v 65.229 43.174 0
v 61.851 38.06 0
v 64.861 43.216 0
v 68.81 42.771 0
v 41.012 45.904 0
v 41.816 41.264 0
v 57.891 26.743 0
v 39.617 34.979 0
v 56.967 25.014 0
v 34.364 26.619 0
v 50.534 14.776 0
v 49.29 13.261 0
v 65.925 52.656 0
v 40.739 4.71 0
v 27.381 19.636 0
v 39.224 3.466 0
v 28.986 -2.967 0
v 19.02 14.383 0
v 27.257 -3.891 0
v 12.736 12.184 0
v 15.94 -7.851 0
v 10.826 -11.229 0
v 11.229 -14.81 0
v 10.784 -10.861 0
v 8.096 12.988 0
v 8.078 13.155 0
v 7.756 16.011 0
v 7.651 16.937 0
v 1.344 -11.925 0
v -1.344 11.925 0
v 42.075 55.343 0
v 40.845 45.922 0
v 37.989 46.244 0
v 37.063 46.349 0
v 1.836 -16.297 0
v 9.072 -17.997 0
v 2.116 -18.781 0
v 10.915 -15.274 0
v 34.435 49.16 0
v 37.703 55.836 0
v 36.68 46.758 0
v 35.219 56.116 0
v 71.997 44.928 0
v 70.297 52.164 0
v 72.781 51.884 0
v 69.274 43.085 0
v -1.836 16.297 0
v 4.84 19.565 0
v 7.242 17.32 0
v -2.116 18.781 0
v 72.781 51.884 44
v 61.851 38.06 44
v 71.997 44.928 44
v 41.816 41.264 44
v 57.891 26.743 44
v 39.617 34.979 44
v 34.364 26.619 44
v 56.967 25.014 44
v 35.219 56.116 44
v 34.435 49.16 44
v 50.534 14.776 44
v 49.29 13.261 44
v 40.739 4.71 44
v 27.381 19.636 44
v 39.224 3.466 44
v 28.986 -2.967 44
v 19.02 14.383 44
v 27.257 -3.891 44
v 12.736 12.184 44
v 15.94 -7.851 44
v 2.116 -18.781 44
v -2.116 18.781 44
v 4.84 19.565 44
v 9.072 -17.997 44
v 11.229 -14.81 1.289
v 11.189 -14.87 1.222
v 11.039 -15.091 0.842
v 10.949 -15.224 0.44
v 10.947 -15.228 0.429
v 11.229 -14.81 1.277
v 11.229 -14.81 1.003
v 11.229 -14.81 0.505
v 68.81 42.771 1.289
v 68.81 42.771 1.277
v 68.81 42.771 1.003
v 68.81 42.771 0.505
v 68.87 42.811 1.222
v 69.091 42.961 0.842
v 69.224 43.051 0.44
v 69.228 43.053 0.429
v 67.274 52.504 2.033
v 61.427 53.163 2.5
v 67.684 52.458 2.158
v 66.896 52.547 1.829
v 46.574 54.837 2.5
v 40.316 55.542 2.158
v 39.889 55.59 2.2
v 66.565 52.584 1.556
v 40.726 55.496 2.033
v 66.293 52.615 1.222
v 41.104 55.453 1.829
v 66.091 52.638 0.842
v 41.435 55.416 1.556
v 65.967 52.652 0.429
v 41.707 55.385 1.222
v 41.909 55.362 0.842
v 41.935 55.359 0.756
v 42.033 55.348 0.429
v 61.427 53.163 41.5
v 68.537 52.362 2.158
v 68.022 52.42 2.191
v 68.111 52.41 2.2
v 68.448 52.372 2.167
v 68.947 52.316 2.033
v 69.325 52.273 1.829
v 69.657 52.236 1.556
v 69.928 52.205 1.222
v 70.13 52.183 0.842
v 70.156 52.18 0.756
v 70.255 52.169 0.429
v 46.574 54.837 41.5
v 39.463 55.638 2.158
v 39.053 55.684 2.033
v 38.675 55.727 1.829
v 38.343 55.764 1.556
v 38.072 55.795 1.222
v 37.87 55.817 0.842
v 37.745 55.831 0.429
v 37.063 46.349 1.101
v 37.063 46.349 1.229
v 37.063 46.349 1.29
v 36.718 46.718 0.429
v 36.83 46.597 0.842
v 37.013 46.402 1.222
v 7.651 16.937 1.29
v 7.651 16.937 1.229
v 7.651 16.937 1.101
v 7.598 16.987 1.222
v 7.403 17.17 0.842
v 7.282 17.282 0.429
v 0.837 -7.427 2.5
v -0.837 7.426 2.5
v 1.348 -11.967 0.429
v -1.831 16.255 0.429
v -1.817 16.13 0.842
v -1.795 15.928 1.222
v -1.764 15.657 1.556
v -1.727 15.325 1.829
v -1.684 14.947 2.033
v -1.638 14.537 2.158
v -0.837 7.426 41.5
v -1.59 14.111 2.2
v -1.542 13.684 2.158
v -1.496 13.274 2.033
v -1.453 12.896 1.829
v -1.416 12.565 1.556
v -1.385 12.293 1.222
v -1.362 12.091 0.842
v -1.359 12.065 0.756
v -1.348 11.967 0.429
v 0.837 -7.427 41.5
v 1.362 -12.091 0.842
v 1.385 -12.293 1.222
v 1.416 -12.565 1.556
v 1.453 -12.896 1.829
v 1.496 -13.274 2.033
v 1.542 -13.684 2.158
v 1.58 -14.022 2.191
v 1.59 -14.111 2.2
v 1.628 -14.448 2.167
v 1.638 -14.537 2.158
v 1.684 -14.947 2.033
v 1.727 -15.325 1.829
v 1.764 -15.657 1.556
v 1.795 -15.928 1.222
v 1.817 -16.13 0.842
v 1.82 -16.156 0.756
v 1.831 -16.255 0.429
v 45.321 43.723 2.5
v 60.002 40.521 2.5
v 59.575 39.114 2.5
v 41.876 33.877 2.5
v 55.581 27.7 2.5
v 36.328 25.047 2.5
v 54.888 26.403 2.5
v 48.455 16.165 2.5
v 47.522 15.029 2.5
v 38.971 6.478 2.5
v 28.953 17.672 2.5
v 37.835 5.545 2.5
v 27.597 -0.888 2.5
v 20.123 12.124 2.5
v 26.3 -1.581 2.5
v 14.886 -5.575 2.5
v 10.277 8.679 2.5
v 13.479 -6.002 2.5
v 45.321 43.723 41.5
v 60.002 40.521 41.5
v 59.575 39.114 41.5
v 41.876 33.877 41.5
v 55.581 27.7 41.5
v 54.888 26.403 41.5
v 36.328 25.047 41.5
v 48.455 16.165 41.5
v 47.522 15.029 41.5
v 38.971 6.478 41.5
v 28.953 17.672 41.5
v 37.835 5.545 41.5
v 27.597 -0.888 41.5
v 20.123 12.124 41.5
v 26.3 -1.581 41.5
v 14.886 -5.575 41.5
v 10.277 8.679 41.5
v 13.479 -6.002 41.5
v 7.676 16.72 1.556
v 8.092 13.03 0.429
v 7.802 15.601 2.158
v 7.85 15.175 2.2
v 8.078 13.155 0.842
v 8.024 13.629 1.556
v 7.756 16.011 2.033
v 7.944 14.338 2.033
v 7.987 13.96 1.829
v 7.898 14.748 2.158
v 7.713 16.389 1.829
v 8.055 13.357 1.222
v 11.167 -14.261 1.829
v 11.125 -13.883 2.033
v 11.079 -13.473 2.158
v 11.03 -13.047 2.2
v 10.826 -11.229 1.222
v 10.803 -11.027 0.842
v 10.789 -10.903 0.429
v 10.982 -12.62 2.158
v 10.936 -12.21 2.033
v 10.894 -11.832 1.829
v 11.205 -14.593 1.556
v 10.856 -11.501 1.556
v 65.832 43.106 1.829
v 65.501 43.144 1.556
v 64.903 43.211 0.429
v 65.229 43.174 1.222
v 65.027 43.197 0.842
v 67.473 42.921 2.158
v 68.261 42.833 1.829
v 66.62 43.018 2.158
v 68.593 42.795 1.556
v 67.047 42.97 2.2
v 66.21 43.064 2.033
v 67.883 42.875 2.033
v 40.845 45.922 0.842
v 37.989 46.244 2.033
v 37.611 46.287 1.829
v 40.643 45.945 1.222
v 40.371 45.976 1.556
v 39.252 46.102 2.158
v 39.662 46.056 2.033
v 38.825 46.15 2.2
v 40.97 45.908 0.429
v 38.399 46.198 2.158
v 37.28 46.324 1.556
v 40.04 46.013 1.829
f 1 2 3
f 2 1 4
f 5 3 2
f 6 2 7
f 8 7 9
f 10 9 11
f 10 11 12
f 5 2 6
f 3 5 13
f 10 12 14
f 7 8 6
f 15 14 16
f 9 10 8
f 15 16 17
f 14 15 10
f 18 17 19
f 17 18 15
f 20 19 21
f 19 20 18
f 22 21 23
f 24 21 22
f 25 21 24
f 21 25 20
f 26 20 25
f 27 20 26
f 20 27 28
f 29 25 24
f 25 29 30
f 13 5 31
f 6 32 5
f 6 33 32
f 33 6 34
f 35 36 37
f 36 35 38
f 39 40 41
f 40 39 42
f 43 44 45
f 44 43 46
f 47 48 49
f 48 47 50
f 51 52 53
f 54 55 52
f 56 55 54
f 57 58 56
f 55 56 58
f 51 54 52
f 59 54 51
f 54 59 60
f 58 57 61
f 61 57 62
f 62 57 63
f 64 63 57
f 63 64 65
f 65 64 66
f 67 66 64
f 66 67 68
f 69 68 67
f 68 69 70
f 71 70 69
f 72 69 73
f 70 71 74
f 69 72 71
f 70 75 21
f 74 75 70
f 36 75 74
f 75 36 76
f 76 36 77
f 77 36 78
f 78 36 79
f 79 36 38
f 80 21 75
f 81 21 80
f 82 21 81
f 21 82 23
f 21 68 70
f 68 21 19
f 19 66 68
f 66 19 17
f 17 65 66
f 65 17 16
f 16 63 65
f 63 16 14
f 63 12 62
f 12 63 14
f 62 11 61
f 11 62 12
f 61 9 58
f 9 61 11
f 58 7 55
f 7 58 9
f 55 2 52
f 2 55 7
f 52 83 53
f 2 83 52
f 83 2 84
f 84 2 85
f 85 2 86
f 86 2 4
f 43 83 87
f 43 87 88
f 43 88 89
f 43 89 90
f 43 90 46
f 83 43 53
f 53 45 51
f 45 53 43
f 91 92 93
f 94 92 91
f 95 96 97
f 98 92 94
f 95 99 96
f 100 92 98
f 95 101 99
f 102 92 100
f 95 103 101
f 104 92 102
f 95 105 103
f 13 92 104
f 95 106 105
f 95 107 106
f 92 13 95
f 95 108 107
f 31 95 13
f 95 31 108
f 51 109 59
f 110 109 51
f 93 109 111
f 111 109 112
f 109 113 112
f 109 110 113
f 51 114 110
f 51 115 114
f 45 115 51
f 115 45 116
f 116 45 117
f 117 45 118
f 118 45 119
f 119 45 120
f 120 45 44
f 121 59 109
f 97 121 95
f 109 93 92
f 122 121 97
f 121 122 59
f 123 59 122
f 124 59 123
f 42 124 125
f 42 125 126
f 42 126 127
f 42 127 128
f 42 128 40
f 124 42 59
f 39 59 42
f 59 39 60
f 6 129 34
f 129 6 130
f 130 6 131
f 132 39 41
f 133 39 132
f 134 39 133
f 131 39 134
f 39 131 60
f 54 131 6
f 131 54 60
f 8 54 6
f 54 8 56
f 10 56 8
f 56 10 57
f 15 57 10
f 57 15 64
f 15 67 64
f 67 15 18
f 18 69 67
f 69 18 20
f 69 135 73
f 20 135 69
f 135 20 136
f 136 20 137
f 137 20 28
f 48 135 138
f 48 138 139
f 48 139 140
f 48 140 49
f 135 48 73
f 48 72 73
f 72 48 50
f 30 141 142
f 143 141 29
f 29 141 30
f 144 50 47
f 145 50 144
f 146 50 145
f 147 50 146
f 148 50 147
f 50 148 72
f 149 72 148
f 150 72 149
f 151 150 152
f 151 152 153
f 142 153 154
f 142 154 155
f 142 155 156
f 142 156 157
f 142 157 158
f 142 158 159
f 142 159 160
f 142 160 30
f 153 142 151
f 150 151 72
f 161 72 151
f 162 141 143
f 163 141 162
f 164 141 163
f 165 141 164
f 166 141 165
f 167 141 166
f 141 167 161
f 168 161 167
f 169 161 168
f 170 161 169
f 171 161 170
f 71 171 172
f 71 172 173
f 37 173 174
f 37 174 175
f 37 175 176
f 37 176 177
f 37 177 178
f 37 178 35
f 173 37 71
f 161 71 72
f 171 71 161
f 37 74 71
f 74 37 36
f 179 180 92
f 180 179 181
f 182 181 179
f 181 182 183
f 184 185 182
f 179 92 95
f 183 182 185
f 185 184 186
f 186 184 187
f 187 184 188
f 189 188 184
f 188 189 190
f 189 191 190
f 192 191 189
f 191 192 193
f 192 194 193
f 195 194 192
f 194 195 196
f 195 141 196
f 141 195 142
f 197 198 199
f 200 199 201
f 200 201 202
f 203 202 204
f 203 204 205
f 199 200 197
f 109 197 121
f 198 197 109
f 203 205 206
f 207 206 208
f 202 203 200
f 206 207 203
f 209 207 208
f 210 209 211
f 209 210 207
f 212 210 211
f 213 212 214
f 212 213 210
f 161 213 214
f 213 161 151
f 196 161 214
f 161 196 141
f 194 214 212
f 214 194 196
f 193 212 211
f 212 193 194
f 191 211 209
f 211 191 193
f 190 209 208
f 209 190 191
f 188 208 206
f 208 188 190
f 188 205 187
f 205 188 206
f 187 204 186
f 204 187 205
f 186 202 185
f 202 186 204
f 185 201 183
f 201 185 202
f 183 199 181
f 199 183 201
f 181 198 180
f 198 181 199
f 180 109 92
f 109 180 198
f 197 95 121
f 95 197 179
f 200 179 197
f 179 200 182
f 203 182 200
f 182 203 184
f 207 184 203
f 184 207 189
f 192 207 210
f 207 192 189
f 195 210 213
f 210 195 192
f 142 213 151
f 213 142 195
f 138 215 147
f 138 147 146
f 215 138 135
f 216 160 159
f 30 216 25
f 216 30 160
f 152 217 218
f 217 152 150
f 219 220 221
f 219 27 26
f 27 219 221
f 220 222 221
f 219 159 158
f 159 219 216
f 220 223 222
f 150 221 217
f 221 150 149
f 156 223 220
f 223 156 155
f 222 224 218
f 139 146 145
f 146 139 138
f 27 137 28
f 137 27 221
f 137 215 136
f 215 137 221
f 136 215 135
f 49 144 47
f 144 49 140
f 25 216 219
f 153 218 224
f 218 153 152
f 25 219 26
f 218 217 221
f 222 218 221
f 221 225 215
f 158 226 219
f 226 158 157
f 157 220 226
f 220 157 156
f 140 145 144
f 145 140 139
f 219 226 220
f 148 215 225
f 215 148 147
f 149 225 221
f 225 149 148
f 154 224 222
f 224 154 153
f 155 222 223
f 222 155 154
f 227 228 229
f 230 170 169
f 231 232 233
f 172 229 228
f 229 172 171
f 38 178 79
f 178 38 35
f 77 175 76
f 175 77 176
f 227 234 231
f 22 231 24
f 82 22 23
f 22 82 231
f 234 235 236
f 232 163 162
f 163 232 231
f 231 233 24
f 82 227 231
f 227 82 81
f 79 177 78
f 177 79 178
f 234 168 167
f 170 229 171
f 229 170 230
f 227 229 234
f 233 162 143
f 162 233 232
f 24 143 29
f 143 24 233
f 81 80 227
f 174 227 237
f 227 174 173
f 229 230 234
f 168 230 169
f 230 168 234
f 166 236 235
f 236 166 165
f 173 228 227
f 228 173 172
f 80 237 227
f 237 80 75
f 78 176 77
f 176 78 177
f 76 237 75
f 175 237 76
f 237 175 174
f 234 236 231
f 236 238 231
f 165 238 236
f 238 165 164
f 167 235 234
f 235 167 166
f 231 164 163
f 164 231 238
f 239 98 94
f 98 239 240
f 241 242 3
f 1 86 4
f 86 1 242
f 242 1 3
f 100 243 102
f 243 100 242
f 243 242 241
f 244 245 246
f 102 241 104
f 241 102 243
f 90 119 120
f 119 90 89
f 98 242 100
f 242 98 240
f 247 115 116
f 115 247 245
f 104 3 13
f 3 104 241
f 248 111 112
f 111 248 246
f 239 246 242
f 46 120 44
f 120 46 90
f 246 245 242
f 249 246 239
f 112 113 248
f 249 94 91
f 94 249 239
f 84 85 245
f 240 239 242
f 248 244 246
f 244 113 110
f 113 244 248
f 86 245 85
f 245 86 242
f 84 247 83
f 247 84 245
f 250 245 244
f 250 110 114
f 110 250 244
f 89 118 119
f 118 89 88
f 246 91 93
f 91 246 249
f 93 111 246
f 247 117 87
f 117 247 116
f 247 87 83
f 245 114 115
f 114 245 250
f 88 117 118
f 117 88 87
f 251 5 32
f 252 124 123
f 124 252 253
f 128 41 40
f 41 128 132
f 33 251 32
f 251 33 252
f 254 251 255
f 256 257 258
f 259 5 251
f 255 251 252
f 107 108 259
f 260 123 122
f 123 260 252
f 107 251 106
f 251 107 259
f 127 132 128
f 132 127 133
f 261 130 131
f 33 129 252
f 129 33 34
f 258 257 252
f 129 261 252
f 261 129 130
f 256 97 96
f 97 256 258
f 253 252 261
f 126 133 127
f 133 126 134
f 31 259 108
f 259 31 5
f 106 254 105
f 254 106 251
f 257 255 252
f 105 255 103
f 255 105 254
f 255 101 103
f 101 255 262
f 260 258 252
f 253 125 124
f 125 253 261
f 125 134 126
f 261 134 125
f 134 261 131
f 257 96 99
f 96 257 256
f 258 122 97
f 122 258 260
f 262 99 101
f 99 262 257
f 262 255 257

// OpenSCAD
$fn = 32;

// ----------------------------------------------------------------------
// Air duct: 20 mm duct, 2.5 mm wall, 44 mm across
// ----------------------------------------------------------------------

// --- parameters (mm) ---
duct_r = 10;              // duct core radius
duct_d = 20;              // duct core diameter
wall = 2.5;               // duct wall thickness
height = 44;              // duct width (extrusion height)
port_r = 18.9;            // port flange half width
port_d = 37.8;            // port flange width
port_t = 7;               // port flange thickness
bolt_d = 4.4;             // port bolt holes
bolt_offset = 14.2;       // bolt hole offset from the port axis

difference() {
  /* outer hull chain: tube with a flat flange plate at every port */
  linear_extrude(height = 44) {
    hull() {
      polygon([[2.116, -18.781], [-2.116, 18.781], [4.84, 19.565], [9.072, -17.997]]);
      translate([9.937, 1.12]) circle(r = 10);
    }
    hull() {
      translate([9.937, 1.12]) circle(r = 10);
      translate([12.016, 1.354]) circle(r = 10);
    }
    hull() {
      translate([12.016, 1.354]) circle(r = 10);
      translate([23.43, 5.348]) circle(r = 10);
    }
    hull() {
      translate([23.43, 5.348]) circle(r = 10);
      translate([33.668, 11.781]) circle(r = 10);
    }
    hull() {
      translate([33.668, 11.781]) circle(r = 10);
      translate([42.219, 20.332]) circle(r = 10);
    }
    hull() {
      translate([42.219, 20.332]) circle(r = 10);
      translate([48.652, 30.57]) circle(r = 10);
    }
    hull() {
      translate([48.652, 30.57]) circle(r = 10);
      translate([52.646, 41.984]) circle(r = 10);
    }
    hull() {
      translate([52.646, 41.984]) circle(r = 10);
      translate([52.88, 44.063]) circle(r = 10);
    }
    hull() {
      translate([52.88, 44.063]) circle(r = 10);
      polygon([[35.219, 56.116], [72.781, 51.884], [71.997, 44.928], [34.435, 49.16]]);
    }
  }
  /* air passage: the same chain inset by the wall, 5 mm proud of the ports */
  translate([0, 0, 2.5]) linear_extrude(height = 39) {
    hull() {
      translate([-4.969, -0.56]) circle(r = 7.5);
      translate([12.016, 1.354]) circle(r = 7.5);
    }
    hull() {
      translate([12.016, 1.354]) circle(r = 7.5);
      translate([23.43, 5.348]) circle(r = 7.5);
    }
    hull() {
      translate([23.43, 5.348]) circle(r = 7.5);
      translate([33.668, 11.781]) circle(r = 7.5);
    }
    hull() {
      translate([33.668, 11.781]) circle(r = 7.5);
      translate([42.219, 20.332]) circle(r = 7.5);
    }
    hull() {
      translate([42.219, 20.332]) circle(r = 7.5);
      translate([48.652, 30.57]) circle(r = 7.5);
    }
    hull() {
      translate([48.652, 30.57]) circle(r = 7.5);
      translate([52.646, 41.984]) circle(r = 7.5);
    }
    hull() {
      translate([52.646, 41.984]) circle(r = 7.5);
      translate([54.56, 58.969]) circle(r = 7.5);
    }
  }
  translate([0, 0]) rotate([0, 0, -83.57]) translate([-14.2, -2.5]) rotate([-90, 0, 0]) cylinder(h = 12, d = 4.4);
  translate([0, 0]) rotate([0, 0, -83.57]) translate([14.2, -2.5]) rotate([-90, 0, 0]) cylinder(h = 12, d = 4.4);
  translate([54, 54]) rotate([0, 0, 173.57]) translate([-14.2, -2.5]) rotate([-90, 0, 0]) cylinder(h = 12, d = 4.4);
  translate([54, 54]) rotate([0, 0, 173.57]) translate([14.2, -2.5]) rotate([-90, 0, 0]) cylinder(h = 12, d = 4.4);
}
